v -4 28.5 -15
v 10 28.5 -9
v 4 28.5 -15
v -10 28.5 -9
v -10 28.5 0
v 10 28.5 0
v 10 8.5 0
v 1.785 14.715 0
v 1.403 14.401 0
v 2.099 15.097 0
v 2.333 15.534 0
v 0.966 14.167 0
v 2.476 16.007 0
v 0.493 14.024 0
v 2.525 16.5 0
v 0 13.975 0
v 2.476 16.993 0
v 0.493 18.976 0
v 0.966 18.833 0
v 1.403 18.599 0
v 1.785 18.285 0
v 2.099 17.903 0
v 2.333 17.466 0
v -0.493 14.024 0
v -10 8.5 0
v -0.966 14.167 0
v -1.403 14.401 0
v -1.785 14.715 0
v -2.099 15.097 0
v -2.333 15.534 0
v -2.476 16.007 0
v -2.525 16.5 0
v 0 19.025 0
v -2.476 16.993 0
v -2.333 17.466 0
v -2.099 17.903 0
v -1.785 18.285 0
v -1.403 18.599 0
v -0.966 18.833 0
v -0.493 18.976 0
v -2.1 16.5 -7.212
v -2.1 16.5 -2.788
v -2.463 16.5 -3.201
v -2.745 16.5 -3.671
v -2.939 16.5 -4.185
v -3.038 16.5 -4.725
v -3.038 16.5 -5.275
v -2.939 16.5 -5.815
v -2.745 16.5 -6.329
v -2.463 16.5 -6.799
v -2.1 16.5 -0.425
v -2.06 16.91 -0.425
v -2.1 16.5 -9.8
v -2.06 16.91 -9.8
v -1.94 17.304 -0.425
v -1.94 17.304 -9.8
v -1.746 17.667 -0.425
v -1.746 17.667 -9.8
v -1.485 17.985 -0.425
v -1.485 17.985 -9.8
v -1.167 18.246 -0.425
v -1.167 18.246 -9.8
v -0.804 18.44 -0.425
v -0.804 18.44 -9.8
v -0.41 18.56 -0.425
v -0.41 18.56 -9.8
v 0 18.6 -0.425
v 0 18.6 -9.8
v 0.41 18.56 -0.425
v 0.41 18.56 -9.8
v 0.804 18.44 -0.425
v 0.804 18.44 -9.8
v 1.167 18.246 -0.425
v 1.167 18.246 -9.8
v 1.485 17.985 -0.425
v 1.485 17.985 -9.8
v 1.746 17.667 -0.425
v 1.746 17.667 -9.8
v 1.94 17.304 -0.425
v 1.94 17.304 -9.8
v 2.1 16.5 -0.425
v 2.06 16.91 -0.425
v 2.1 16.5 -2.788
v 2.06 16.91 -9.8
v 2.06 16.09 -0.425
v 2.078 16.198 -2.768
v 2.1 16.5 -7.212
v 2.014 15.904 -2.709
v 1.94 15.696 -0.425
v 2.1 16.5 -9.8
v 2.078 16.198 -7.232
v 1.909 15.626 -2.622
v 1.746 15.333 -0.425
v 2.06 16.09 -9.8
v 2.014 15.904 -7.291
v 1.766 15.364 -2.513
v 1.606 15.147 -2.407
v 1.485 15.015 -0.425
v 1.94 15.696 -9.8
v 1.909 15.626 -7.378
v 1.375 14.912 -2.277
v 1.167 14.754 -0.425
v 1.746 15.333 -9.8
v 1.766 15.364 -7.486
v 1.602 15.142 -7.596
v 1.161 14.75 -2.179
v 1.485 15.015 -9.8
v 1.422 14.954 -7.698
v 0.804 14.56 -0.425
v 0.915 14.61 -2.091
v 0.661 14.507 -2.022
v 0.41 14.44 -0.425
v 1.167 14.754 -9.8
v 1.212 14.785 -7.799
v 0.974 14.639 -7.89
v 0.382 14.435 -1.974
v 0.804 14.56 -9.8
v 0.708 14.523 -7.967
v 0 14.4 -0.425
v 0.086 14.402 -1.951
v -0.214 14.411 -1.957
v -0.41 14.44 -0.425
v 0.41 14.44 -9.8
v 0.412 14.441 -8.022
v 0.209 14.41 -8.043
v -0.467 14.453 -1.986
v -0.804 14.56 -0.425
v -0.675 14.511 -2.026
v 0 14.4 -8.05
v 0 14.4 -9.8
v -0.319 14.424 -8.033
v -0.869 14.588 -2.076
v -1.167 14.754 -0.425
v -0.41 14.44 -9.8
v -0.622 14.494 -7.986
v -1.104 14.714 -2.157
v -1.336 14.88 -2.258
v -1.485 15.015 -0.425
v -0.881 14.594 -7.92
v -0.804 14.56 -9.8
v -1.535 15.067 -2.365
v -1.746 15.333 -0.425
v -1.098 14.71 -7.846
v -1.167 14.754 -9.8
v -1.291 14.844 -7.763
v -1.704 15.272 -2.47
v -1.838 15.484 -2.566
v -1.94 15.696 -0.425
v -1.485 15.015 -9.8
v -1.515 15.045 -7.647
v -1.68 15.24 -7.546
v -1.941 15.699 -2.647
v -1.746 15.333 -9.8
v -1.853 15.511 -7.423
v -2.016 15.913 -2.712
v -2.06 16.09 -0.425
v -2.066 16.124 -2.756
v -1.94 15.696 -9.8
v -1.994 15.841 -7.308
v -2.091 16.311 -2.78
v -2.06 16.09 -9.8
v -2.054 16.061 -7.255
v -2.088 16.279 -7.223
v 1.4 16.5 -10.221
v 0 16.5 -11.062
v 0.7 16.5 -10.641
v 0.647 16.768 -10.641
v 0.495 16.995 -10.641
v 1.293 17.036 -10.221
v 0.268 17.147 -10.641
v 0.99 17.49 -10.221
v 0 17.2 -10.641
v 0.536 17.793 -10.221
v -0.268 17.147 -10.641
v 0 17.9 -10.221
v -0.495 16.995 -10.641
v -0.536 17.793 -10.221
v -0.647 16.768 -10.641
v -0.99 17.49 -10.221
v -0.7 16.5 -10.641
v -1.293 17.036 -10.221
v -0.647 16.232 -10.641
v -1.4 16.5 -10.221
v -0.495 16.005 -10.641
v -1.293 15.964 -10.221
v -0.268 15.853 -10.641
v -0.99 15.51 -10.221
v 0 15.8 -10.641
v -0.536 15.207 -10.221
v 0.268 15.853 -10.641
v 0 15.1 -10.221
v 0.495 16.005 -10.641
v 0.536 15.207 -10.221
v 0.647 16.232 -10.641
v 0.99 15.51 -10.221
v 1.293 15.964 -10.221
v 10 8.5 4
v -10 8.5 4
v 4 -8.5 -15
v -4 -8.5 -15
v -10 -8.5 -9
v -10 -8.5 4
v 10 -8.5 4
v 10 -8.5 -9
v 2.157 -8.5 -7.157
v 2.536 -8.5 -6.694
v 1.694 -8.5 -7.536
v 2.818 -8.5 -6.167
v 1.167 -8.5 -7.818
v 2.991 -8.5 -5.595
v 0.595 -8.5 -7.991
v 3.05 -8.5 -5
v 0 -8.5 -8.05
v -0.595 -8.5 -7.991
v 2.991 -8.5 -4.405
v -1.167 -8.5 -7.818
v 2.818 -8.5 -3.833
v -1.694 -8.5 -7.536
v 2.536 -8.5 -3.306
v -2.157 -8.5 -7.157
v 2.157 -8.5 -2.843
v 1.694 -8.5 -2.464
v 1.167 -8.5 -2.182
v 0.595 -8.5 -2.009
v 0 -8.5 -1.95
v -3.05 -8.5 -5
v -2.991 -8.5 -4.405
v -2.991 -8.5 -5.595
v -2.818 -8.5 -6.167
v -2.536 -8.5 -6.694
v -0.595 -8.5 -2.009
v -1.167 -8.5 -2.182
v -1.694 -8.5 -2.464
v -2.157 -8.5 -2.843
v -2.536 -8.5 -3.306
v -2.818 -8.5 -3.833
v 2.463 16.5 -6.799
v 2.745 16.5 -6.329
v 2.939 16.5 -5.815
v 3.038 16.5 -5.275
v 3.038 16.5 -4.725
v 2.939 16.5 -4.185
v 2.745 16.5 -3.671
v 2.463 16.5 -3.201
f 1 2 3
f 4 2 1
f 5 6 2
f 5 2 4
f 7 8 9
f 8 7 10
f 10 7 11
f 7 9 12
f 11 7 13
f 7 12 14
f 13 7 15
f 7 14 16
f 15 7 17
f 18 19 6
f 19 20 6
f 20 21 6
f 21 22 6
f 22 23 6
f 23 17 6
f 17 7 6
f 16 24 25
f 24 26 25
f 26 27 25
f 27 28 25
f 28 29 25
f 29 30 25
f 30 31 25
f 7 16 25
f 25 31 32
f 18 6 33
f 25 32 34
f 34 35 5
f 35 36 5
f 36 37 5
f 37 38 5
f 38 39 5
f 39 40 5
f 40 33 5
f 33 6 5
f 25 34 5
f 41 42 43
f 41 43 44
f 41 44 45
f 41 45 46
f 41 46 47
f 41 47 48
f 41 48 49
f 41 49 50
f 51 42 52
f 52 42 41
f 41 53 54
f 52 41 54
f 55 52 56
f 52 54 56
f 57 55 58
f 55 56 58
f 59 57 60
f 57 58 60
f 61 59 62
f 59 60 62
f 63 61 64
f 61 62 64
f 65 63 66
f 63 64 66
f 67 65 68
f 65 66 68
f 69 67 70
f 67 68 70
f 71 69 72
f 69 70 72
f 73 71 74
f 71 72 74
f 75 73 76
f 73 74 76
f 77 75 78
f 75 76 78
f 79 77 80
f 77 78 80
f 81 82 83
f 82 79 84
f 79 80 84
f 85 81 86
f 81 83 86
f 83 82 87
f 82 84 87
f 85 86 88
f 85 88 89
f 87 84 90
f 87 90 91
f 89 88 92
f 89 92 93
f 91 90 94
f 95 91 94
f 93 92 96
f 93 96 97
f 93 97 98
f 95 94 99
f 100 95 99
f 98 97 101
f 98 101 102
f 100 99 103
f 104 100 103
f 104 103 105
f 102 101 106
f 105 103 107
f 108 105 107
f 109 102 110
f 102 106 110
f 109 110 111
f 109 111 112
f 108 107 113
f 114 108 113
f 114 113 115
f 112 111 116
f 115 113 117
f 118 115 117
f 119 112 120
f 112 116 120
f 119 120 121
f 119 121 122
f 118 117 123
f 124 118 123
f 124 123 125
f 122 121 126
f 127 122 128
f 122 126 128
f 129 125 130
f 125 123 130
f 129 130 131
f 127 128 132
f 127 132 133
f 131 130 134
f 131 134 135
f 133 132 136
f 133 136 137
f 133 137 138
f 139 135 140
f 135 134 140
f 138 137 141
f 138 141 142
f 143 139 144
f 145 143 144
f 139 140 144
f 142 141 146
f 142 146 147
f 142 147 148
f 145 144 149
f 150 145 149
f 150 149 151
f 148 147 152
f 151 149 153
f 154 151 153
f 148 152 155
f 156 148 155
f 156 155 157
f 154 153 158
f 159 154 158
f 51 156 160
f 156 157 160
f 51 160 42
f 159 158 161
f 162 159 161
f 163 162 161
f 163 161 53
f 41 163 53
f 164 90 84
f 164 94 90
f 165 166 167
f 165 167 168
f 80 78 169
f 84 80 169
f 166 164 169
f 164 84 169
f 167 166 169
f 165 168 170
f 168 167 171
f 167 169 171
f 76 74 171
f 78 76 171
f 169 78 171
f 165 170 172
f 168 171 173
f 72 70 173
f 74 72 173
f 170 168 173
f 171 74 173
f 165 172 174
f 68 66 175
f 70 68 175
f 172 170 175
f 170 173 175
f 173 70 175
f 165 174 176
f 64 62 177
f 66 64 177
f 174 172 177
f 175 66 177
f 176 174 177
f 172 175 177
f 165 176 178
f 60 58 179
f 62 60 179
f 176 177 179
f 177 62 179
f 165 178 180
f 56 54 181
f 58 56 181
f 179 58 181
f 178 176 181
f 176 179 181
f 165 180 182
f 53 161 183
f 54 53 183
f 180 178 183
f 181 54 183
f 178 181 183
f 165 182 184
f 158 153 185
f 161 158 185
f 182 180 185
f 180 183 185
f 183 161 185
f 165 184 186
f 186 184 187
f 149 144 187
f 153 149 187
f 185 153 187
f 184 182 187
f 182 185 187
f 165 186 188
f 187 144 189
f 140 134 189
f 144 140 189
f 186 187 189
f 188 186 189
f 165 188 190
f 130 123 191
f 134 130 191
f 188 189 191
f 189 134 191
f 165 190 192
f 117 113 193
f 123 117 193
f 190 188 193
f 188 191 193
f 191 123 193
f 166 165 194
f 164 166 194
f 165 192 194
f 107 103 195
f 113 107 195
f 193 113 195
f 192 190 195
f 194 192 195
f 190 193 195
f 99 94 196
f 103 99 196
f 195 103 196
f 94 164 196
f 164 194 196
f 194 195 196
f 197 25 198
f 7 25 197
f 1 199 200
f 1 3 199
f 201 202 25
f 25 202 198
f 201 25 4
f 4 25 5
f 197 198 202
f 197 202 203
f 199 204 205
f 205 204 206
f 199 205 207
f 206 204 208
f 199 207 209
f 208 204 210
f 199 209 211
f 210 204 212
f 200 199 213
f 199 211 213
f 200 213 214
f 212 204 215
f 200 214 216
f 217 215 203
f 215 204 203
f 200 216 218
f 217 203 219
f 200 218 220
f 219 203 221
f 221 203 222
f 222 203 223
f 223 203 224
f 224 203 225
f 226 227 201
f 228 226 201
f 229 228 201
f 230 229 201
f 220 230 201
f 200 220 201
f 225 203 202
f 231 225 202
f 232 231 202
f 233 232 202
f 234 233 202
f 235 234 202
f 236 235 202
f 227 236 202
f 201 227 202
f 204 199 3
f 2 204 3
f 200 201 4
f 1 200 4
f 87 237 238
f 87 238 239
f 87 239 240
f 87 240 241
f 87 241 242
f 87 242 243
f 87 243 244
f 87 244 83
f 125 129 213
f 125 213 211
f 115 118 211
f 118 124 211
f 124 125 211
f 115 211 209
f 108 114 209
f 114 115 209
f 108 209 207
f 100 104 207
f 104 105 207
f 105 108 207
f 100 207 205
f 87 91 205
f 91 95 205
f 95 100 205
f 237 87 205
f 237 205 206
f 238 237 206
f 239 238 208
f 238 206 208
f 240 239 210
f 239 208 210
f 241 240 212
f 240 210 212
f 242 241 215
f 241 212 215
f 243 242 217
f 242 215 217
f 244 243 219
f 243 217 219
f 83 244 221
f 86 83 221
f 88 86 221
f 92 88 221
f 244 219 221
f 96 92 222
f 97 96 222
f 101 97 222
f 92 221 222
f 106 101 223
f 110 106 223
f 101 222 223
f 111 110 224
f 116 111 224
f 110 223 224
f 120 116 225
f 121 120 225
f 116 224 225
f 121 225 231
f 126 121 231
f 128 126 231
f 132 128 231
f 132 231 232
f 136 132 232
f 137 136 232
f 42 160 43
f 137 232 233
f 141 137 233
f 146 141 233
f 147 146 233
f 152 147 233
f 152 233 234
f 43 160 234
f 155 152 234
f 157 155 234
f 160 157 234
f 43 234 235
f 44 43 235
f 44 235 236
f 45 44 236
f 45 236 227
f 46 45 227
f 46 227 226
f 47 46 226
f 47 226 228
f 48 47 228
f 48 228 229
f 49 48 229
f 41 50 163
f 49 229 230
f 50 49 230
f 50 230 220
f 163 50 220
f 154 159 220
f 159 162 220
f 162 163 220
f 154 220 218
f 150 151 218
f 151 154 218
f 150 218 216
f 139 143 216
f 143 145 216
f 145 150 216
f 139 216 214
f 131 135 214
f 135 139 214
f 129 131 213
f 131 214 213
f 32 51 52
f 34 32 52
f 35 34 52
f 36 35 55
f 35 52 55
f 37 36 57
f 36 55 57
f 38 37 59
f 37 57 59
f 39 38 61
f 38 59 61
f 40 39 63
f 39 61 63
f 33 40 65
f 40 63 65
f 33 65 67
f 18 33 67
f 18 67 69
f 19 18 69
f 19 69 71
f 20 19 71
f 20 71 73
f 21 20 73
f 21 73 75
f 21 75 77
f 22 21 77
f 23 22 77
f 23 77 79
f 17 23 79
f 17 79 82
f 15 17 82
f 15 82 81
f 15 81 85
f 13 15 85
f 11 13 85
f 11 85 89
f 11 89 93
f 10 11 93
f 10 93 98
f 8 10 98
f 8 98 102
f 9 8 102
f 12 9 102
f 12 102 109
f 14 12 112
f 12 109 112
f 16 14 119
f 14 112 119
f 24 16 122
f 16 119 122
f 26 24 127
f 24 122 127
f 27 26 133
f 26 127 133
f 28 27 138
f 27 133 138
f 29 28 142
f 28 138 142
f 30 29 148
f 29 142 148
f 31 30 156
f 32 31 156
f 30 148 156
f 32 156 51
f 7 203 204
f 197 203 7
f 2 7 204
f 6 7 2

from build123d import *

# Parameters (mm, degrees)
SKETCH1_W                   = 20
SKETCH1_H                   = 17
BOSS_EXTRUDE1_DEPTH         = 4
SKETCH2_W                   = 20
SKETCH2_H                   = 37
BOSS_EXTRUDE2_DEPTH         = 15
M5_TAPPED_HOLE1_D           = 4.2
M5_TAPPED_HOLE1_DEPTH       = 9.8
M5_TAPPED_HOLE1_CSINK_D     = 5.05
M5_TAPPED_HOLE1_CSINK_ANGLE = 90
M5_TAPPED_HOLE1_TIP         = 1.2618073
SKETCH5_R                   = 3.05
CUT_EXTRUDE1_DEPTH          = 25
CHAMFER1_SIZE               = 6


with BuildPart() as part:
    # Sketch1 → Boss-Extrude1 (new body)
    with BuildSketch(Plane.XY):
        Rectangle(SKETCH1_W, SKETCH1_H)
    extrude(amount=BOSS_EXTRUDE1_DEPTH)

    # Sketch2 → Boss-Extrude2 (add)
    with BuildSketch(Plane(origin=(0, 0, 0), x_dir=(-1, 0, 0), z_dir=(0, 0, -1))):
        with Locations((0, 10)):
            Rectangle(SKETCH2_W, SKETCH2_H)
    extrude(amount=BOSS_EXTRUDE2_DEPTH)

    # M5 Tapped Hole1
    with Locations(Plane(origin=(0, 16.5, 0), x_dir=(1, 0, 0), z_dir=(0, 0, 1))):
        with Locations((0, 0)):
            CounterSinkHole(M5_TAPPED_HOLE1_D / 2, M5_TAPPED_HOLE1_CSINK_D / 2, depth=M5_TAPPED_HOLE1_DEPTH, counter_sink_angle=M5_TAPPED_HOLE1_CSINK_ANGLE)
            with Locations((0, 0, -(M5_TAPPED_HOLE1_DEPTH + M5_TAPPED_HOLE1_TIP / 2))):  # 118° drill point
                Cone(0, M5_TAPPED_HOLE1_D / 2, M5_TAPPED_HOLE1_TIP, mode=Mode.SUBTRACT)

    # Sketch5 → Cut-Extrude1 (cut)
    with BuildSketch(Plane.XZ.offset(8.5)):
        with Locations(Location((0, -5, 0), (0, 0, 270))):
            Circle(SKETCH5_R)
    extrude(amount=-CUT_EXTRUDE1_DEPTH, mode=Mode.SUBTRACT)

    # Chamfer1
    chamfer1_edges = [part.edges().sort_by_distance(p)[0] for p in [
        (10, 10, -15),
        (-10, 10, -15),
    ]]
    chamfer(chamfer1_edges, length=CHAMFER1_SIZE)


solid = part.part
